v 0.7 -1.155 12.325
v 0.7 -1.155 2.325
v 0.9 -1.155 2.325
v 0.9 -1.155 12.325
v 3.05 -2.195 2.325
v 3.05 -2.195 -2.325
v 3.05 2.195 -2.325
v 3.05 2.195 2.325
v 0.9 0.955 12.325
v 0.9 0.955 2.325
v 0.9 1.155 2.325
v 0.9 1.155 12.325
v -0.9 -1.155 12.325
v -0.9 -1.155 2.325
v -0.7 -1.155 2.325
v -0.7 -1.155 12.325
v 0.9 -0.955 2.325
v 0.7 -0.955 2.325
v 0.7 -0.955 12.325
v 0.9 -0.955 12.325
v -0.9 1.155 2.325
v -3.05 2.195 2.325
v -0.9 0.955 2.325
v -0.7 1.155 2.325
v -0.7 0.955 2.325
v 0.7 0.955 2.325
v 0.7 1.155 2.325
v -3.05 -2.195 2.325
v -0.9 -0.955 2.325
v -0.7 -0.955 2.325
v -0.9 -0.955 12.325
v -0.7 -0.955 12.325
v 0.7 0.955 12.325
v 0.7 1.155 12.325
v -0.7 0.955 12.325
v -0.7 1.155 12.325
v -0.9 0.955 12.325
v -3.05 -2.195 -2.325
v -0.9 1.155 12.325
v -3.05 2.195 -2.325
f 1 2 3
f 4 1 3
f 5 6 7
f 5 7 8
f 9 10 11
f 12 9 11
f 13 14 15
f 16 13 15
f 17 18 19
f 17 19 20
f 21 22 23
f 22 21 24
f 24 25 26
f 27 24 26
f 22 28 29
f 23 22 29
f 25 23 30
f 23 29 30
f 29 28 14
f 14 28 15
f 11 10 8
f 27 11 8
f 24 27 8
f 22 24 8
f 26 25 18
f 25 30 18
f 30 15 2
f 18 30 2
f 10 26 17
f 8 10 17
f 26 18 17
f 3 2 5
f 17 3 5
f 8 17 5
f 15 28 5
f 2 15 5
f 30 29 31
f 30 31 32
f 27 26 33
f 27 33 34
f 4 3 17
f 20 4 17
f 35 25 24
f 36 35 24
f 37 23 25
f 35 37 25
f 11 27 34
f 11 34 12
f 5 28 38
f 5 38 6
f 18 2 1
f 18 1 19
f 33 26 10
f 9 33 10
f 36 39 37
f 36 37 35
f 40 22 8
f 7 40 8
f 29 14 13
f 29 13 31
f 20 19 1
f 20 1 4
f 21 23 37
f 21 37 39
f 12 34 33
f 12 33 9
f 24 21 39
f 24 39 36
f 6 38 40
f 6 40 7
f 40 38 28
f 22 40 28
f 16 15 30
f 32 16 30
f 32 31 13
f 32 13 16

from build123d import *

# Parameters (mm, degrees)
F0_W     = 6.1
F0_H     = 4.65
F1_DEPTH = 2.195
F3_W     = 0.2
F3_H     = 0.2
F4_DEPTH = 10


# Not quite as in the source:
# - a feature of the source that left no trace in its solid (it failed there, or was rolled back) is left out


with BuildPart() as f1:
    # F0 (on Front) → F1 (new body, symmetric)
    with BuildSketch(Plane.XZ):
        Rectangle(F0_W, F0_H)
    extrude(amount=F1_DEPTH, both=True)

    # F3 (on face) → F4 (join)
    with BuildSketch(Plane.XY.offset(2.325)):
        with Locations((0.8, 1.055)):
            Rectangle(F3_W, F3_H)
        with Locations((-0.8, 1.055)):
            Rectangle(F3_W, F3_H)
        with Locations((0.8, -1.055)):
            Rectangle(F3_W, F3_H)
        with Locations((-0.8, -1.055)):
            Rectangle(F3_W, F3_H)
    extrude(amount=F4_DEPTH)


solid = f1.part
